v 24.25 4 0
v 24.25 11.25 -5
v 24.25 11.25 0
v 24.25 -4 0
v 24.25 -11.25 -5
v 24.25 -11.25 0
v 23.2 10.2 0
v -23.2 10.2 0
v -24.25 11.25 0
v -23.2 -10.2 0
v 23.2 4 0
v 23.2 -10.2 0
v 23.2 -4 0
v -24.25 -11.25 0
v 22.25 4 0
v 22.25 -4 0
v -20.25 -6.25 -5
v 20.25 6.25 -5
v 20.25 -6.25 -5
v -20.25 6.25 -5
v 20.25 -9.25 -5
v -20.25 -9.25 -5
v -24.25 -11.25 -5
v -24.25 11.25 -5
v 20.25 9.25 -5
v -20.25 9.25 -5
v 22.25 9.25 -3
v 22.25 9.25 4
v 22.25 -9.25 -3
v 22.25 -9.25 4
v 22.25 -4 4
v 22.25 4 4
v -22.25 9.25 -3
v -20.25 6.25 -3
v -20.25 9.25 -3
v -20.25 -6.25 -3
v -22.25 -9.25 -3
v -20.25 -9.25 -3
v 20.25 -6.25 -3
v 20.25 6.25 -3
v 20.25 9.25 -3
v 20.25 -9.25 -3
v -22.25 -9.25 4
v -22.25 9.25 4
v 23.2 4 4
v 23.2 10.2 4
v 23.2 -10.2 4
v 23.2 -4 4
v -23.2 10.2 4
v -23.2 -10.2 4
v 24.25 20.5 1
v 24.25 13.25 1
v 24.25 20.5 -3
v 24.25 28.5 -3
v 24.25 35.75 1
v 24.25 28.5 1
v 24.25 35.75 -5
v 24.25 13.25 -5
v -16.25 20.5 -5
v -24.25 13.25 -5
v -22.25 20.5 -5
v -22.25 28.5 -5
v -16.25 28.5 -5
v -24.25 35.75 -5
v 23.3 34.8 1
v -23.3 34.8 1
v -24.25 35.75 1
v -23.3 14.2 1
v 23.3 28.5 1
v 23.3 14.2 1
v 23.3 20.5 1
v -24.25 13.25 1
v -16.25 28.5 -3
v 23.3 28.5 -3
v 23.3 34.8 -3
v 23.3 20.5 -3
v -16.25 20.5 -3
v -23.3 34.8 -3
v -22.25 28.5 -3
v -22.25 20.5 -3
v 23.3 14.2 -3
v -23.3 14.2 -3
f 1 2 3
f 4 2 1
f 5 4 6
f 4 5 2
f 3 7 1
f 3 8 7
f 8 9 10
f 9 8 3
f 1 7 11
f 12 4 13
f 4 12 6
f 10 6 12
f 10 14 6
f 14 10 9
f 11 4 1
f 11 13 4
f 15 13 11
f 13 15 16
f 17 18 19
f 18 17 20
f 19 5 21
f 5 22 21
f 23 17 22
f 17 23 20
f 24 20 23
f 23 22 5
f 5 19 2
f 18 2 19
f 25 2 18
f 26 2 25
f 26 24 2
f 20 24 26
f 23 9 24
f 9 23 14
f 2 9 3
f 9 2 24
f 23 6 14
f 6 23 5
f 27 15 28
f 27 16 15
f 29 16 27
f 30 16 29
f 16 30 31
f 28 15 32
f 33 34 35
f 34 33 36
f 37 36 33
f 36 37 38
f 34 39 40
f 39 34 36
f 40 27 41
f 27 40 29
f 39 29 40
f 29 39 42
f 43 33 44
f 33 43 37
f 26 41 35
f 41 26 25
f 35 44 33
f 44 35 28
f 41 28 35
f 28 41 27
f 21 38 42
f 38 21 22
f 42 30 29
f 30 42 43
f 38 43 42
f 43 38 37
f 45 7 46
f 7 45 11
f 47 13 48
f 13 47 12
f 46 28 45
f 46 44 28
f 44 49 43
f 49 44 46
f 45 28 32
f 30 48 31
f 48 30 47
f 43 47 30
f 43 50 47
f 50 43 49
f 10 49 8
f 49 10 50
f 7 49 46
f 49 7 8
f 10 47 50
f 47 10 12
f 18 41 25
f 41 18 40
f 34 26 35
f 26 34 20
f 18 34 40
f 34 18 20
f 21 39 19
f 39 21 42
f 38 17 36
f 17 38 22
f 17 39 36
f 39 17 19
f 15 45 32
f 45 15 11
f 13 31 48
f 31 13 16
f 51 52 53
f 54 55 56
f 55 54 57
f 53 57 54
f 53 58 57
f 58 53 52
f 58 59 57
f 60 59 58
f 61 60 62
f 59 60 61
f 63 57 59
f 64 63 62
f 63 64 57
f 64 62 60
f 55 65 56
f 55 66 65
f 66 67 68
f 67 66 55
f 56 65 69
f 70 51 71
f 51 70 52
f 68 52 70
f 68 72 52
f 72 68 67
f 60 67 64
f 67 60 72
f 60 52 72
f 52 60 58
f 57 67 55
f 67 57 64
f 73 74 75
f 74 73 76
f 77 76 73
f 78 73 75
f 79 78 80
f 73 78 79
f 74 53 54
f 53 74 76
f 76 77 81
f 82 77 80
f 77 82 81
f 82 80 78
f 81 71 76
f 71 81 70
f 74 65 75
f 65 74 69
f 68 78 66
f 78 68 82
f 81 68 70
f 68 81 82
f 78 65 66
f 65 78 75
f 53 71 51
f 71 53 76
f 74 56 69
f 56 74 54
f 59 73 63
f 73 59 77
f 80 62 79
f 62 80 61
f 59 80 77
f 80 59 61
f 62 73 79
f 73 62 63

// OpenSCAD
arduino_w=18.5;
arduino_l=44.5;//43;
arduino_lower_h=3;
arduino_upper_h=4;

h_sum = arduino_lower_h+arduino_upper_h;


usb_w=8;

side_w=3;
v_side_offset=2;

v_w=8;
v_h=6;


arduino_thickness=2;

tol=0.05;

arduino_outer_w=arduino_w +2*arduino_thickness;
arduino_outer_l=arduino_l +2*arduino_thickness;
arduino_outer_h=h_sum     +2*arduino_thickness;

arduino_case_bottom();

translate([0,arduino_w+arduino_thickness*3,arduino_upper_h-arduino_lower_h])
rotate([180,0,0])
arduino_case_top();

PIN_TOP=1;
PIN_EXTRA_TOP=0;

module arduino_case_bottom(){
    difference(){
        union(){
            translate([0,0,-arduino_lower_h/2])
            difference(){
                translate([0,0,-arduino_thickness/2])
                cube([arduino_l+2*arduino_thickness,arduino_w+2*arduino_thickness,arduino_lower_h+arduino_thickness],center=true);
                cube([arduino_l,arduino_w,arduino_lower_h],center=true);
            }
            connector(tol);

            
        }
        usb();
        
        if (PIN_TOP){
            side(1);
            side(-1);
        }

        if(PIN_EXTRA_TOP){
            extrea_pins();
        }
    }
}

module arduino_case_top(){
    difference(){
        translate([0,0,arduino_upper_h/2])
        difference(){
            translate([0,0,arduino_thickness/2])
            cube([arduino_l+2*arduino_thickness,arduino_w+2*arduino_thickness,arduino_upper_h+arduino_thickness],center=true);
            cube([arduino_l,arduino_w,arduino_upper_h],center=true);
        }
        connector(-tol);
        usb();
        if (!PIN_TOP){
            side(1);
            side(-1);
        }

        if(!PIN_EXTRA_TOP){
            extrea_pins();
        }
    }
}

module side(converter=1){
    translate([0,converter/2*(arduino_w-side_w),0])
    cube([arduino_l-2*v_side_offset,side_w,2*(arduino_upper_h+arduino_lower_h+arduino_thickness)],center=true);
}



module extrea_pins(){
    translate([-arduino_l/2+v_h/2,0,0])
    // translate([-arduino_l/2+v_h/2,0,-(arduino_upper_h+arduino_thickness)])
    cube([v_h,v_w,2*(arduino_upper_h+arduino_lower_h+arduino_thickness)],center=true);
}

module usb(){
    translate([(arduino_l+arduino_thickness)/2,0,arduino_upper_h/2])
    cube([arduino_thickness,usb_w,arduino_upper_h],center=true);
}

module connector(tol){
    translate([0,0,arduino_upper_h/2])
    difference(){
        cube([arduino_l+arduino_thickness-tol*2,arduino_w+arduino_thickness-tol*2,arduino_upper_h],center=true);
        cube([arduino_l,arduino_w,arduino_upper_h],center=true);
    }
}
